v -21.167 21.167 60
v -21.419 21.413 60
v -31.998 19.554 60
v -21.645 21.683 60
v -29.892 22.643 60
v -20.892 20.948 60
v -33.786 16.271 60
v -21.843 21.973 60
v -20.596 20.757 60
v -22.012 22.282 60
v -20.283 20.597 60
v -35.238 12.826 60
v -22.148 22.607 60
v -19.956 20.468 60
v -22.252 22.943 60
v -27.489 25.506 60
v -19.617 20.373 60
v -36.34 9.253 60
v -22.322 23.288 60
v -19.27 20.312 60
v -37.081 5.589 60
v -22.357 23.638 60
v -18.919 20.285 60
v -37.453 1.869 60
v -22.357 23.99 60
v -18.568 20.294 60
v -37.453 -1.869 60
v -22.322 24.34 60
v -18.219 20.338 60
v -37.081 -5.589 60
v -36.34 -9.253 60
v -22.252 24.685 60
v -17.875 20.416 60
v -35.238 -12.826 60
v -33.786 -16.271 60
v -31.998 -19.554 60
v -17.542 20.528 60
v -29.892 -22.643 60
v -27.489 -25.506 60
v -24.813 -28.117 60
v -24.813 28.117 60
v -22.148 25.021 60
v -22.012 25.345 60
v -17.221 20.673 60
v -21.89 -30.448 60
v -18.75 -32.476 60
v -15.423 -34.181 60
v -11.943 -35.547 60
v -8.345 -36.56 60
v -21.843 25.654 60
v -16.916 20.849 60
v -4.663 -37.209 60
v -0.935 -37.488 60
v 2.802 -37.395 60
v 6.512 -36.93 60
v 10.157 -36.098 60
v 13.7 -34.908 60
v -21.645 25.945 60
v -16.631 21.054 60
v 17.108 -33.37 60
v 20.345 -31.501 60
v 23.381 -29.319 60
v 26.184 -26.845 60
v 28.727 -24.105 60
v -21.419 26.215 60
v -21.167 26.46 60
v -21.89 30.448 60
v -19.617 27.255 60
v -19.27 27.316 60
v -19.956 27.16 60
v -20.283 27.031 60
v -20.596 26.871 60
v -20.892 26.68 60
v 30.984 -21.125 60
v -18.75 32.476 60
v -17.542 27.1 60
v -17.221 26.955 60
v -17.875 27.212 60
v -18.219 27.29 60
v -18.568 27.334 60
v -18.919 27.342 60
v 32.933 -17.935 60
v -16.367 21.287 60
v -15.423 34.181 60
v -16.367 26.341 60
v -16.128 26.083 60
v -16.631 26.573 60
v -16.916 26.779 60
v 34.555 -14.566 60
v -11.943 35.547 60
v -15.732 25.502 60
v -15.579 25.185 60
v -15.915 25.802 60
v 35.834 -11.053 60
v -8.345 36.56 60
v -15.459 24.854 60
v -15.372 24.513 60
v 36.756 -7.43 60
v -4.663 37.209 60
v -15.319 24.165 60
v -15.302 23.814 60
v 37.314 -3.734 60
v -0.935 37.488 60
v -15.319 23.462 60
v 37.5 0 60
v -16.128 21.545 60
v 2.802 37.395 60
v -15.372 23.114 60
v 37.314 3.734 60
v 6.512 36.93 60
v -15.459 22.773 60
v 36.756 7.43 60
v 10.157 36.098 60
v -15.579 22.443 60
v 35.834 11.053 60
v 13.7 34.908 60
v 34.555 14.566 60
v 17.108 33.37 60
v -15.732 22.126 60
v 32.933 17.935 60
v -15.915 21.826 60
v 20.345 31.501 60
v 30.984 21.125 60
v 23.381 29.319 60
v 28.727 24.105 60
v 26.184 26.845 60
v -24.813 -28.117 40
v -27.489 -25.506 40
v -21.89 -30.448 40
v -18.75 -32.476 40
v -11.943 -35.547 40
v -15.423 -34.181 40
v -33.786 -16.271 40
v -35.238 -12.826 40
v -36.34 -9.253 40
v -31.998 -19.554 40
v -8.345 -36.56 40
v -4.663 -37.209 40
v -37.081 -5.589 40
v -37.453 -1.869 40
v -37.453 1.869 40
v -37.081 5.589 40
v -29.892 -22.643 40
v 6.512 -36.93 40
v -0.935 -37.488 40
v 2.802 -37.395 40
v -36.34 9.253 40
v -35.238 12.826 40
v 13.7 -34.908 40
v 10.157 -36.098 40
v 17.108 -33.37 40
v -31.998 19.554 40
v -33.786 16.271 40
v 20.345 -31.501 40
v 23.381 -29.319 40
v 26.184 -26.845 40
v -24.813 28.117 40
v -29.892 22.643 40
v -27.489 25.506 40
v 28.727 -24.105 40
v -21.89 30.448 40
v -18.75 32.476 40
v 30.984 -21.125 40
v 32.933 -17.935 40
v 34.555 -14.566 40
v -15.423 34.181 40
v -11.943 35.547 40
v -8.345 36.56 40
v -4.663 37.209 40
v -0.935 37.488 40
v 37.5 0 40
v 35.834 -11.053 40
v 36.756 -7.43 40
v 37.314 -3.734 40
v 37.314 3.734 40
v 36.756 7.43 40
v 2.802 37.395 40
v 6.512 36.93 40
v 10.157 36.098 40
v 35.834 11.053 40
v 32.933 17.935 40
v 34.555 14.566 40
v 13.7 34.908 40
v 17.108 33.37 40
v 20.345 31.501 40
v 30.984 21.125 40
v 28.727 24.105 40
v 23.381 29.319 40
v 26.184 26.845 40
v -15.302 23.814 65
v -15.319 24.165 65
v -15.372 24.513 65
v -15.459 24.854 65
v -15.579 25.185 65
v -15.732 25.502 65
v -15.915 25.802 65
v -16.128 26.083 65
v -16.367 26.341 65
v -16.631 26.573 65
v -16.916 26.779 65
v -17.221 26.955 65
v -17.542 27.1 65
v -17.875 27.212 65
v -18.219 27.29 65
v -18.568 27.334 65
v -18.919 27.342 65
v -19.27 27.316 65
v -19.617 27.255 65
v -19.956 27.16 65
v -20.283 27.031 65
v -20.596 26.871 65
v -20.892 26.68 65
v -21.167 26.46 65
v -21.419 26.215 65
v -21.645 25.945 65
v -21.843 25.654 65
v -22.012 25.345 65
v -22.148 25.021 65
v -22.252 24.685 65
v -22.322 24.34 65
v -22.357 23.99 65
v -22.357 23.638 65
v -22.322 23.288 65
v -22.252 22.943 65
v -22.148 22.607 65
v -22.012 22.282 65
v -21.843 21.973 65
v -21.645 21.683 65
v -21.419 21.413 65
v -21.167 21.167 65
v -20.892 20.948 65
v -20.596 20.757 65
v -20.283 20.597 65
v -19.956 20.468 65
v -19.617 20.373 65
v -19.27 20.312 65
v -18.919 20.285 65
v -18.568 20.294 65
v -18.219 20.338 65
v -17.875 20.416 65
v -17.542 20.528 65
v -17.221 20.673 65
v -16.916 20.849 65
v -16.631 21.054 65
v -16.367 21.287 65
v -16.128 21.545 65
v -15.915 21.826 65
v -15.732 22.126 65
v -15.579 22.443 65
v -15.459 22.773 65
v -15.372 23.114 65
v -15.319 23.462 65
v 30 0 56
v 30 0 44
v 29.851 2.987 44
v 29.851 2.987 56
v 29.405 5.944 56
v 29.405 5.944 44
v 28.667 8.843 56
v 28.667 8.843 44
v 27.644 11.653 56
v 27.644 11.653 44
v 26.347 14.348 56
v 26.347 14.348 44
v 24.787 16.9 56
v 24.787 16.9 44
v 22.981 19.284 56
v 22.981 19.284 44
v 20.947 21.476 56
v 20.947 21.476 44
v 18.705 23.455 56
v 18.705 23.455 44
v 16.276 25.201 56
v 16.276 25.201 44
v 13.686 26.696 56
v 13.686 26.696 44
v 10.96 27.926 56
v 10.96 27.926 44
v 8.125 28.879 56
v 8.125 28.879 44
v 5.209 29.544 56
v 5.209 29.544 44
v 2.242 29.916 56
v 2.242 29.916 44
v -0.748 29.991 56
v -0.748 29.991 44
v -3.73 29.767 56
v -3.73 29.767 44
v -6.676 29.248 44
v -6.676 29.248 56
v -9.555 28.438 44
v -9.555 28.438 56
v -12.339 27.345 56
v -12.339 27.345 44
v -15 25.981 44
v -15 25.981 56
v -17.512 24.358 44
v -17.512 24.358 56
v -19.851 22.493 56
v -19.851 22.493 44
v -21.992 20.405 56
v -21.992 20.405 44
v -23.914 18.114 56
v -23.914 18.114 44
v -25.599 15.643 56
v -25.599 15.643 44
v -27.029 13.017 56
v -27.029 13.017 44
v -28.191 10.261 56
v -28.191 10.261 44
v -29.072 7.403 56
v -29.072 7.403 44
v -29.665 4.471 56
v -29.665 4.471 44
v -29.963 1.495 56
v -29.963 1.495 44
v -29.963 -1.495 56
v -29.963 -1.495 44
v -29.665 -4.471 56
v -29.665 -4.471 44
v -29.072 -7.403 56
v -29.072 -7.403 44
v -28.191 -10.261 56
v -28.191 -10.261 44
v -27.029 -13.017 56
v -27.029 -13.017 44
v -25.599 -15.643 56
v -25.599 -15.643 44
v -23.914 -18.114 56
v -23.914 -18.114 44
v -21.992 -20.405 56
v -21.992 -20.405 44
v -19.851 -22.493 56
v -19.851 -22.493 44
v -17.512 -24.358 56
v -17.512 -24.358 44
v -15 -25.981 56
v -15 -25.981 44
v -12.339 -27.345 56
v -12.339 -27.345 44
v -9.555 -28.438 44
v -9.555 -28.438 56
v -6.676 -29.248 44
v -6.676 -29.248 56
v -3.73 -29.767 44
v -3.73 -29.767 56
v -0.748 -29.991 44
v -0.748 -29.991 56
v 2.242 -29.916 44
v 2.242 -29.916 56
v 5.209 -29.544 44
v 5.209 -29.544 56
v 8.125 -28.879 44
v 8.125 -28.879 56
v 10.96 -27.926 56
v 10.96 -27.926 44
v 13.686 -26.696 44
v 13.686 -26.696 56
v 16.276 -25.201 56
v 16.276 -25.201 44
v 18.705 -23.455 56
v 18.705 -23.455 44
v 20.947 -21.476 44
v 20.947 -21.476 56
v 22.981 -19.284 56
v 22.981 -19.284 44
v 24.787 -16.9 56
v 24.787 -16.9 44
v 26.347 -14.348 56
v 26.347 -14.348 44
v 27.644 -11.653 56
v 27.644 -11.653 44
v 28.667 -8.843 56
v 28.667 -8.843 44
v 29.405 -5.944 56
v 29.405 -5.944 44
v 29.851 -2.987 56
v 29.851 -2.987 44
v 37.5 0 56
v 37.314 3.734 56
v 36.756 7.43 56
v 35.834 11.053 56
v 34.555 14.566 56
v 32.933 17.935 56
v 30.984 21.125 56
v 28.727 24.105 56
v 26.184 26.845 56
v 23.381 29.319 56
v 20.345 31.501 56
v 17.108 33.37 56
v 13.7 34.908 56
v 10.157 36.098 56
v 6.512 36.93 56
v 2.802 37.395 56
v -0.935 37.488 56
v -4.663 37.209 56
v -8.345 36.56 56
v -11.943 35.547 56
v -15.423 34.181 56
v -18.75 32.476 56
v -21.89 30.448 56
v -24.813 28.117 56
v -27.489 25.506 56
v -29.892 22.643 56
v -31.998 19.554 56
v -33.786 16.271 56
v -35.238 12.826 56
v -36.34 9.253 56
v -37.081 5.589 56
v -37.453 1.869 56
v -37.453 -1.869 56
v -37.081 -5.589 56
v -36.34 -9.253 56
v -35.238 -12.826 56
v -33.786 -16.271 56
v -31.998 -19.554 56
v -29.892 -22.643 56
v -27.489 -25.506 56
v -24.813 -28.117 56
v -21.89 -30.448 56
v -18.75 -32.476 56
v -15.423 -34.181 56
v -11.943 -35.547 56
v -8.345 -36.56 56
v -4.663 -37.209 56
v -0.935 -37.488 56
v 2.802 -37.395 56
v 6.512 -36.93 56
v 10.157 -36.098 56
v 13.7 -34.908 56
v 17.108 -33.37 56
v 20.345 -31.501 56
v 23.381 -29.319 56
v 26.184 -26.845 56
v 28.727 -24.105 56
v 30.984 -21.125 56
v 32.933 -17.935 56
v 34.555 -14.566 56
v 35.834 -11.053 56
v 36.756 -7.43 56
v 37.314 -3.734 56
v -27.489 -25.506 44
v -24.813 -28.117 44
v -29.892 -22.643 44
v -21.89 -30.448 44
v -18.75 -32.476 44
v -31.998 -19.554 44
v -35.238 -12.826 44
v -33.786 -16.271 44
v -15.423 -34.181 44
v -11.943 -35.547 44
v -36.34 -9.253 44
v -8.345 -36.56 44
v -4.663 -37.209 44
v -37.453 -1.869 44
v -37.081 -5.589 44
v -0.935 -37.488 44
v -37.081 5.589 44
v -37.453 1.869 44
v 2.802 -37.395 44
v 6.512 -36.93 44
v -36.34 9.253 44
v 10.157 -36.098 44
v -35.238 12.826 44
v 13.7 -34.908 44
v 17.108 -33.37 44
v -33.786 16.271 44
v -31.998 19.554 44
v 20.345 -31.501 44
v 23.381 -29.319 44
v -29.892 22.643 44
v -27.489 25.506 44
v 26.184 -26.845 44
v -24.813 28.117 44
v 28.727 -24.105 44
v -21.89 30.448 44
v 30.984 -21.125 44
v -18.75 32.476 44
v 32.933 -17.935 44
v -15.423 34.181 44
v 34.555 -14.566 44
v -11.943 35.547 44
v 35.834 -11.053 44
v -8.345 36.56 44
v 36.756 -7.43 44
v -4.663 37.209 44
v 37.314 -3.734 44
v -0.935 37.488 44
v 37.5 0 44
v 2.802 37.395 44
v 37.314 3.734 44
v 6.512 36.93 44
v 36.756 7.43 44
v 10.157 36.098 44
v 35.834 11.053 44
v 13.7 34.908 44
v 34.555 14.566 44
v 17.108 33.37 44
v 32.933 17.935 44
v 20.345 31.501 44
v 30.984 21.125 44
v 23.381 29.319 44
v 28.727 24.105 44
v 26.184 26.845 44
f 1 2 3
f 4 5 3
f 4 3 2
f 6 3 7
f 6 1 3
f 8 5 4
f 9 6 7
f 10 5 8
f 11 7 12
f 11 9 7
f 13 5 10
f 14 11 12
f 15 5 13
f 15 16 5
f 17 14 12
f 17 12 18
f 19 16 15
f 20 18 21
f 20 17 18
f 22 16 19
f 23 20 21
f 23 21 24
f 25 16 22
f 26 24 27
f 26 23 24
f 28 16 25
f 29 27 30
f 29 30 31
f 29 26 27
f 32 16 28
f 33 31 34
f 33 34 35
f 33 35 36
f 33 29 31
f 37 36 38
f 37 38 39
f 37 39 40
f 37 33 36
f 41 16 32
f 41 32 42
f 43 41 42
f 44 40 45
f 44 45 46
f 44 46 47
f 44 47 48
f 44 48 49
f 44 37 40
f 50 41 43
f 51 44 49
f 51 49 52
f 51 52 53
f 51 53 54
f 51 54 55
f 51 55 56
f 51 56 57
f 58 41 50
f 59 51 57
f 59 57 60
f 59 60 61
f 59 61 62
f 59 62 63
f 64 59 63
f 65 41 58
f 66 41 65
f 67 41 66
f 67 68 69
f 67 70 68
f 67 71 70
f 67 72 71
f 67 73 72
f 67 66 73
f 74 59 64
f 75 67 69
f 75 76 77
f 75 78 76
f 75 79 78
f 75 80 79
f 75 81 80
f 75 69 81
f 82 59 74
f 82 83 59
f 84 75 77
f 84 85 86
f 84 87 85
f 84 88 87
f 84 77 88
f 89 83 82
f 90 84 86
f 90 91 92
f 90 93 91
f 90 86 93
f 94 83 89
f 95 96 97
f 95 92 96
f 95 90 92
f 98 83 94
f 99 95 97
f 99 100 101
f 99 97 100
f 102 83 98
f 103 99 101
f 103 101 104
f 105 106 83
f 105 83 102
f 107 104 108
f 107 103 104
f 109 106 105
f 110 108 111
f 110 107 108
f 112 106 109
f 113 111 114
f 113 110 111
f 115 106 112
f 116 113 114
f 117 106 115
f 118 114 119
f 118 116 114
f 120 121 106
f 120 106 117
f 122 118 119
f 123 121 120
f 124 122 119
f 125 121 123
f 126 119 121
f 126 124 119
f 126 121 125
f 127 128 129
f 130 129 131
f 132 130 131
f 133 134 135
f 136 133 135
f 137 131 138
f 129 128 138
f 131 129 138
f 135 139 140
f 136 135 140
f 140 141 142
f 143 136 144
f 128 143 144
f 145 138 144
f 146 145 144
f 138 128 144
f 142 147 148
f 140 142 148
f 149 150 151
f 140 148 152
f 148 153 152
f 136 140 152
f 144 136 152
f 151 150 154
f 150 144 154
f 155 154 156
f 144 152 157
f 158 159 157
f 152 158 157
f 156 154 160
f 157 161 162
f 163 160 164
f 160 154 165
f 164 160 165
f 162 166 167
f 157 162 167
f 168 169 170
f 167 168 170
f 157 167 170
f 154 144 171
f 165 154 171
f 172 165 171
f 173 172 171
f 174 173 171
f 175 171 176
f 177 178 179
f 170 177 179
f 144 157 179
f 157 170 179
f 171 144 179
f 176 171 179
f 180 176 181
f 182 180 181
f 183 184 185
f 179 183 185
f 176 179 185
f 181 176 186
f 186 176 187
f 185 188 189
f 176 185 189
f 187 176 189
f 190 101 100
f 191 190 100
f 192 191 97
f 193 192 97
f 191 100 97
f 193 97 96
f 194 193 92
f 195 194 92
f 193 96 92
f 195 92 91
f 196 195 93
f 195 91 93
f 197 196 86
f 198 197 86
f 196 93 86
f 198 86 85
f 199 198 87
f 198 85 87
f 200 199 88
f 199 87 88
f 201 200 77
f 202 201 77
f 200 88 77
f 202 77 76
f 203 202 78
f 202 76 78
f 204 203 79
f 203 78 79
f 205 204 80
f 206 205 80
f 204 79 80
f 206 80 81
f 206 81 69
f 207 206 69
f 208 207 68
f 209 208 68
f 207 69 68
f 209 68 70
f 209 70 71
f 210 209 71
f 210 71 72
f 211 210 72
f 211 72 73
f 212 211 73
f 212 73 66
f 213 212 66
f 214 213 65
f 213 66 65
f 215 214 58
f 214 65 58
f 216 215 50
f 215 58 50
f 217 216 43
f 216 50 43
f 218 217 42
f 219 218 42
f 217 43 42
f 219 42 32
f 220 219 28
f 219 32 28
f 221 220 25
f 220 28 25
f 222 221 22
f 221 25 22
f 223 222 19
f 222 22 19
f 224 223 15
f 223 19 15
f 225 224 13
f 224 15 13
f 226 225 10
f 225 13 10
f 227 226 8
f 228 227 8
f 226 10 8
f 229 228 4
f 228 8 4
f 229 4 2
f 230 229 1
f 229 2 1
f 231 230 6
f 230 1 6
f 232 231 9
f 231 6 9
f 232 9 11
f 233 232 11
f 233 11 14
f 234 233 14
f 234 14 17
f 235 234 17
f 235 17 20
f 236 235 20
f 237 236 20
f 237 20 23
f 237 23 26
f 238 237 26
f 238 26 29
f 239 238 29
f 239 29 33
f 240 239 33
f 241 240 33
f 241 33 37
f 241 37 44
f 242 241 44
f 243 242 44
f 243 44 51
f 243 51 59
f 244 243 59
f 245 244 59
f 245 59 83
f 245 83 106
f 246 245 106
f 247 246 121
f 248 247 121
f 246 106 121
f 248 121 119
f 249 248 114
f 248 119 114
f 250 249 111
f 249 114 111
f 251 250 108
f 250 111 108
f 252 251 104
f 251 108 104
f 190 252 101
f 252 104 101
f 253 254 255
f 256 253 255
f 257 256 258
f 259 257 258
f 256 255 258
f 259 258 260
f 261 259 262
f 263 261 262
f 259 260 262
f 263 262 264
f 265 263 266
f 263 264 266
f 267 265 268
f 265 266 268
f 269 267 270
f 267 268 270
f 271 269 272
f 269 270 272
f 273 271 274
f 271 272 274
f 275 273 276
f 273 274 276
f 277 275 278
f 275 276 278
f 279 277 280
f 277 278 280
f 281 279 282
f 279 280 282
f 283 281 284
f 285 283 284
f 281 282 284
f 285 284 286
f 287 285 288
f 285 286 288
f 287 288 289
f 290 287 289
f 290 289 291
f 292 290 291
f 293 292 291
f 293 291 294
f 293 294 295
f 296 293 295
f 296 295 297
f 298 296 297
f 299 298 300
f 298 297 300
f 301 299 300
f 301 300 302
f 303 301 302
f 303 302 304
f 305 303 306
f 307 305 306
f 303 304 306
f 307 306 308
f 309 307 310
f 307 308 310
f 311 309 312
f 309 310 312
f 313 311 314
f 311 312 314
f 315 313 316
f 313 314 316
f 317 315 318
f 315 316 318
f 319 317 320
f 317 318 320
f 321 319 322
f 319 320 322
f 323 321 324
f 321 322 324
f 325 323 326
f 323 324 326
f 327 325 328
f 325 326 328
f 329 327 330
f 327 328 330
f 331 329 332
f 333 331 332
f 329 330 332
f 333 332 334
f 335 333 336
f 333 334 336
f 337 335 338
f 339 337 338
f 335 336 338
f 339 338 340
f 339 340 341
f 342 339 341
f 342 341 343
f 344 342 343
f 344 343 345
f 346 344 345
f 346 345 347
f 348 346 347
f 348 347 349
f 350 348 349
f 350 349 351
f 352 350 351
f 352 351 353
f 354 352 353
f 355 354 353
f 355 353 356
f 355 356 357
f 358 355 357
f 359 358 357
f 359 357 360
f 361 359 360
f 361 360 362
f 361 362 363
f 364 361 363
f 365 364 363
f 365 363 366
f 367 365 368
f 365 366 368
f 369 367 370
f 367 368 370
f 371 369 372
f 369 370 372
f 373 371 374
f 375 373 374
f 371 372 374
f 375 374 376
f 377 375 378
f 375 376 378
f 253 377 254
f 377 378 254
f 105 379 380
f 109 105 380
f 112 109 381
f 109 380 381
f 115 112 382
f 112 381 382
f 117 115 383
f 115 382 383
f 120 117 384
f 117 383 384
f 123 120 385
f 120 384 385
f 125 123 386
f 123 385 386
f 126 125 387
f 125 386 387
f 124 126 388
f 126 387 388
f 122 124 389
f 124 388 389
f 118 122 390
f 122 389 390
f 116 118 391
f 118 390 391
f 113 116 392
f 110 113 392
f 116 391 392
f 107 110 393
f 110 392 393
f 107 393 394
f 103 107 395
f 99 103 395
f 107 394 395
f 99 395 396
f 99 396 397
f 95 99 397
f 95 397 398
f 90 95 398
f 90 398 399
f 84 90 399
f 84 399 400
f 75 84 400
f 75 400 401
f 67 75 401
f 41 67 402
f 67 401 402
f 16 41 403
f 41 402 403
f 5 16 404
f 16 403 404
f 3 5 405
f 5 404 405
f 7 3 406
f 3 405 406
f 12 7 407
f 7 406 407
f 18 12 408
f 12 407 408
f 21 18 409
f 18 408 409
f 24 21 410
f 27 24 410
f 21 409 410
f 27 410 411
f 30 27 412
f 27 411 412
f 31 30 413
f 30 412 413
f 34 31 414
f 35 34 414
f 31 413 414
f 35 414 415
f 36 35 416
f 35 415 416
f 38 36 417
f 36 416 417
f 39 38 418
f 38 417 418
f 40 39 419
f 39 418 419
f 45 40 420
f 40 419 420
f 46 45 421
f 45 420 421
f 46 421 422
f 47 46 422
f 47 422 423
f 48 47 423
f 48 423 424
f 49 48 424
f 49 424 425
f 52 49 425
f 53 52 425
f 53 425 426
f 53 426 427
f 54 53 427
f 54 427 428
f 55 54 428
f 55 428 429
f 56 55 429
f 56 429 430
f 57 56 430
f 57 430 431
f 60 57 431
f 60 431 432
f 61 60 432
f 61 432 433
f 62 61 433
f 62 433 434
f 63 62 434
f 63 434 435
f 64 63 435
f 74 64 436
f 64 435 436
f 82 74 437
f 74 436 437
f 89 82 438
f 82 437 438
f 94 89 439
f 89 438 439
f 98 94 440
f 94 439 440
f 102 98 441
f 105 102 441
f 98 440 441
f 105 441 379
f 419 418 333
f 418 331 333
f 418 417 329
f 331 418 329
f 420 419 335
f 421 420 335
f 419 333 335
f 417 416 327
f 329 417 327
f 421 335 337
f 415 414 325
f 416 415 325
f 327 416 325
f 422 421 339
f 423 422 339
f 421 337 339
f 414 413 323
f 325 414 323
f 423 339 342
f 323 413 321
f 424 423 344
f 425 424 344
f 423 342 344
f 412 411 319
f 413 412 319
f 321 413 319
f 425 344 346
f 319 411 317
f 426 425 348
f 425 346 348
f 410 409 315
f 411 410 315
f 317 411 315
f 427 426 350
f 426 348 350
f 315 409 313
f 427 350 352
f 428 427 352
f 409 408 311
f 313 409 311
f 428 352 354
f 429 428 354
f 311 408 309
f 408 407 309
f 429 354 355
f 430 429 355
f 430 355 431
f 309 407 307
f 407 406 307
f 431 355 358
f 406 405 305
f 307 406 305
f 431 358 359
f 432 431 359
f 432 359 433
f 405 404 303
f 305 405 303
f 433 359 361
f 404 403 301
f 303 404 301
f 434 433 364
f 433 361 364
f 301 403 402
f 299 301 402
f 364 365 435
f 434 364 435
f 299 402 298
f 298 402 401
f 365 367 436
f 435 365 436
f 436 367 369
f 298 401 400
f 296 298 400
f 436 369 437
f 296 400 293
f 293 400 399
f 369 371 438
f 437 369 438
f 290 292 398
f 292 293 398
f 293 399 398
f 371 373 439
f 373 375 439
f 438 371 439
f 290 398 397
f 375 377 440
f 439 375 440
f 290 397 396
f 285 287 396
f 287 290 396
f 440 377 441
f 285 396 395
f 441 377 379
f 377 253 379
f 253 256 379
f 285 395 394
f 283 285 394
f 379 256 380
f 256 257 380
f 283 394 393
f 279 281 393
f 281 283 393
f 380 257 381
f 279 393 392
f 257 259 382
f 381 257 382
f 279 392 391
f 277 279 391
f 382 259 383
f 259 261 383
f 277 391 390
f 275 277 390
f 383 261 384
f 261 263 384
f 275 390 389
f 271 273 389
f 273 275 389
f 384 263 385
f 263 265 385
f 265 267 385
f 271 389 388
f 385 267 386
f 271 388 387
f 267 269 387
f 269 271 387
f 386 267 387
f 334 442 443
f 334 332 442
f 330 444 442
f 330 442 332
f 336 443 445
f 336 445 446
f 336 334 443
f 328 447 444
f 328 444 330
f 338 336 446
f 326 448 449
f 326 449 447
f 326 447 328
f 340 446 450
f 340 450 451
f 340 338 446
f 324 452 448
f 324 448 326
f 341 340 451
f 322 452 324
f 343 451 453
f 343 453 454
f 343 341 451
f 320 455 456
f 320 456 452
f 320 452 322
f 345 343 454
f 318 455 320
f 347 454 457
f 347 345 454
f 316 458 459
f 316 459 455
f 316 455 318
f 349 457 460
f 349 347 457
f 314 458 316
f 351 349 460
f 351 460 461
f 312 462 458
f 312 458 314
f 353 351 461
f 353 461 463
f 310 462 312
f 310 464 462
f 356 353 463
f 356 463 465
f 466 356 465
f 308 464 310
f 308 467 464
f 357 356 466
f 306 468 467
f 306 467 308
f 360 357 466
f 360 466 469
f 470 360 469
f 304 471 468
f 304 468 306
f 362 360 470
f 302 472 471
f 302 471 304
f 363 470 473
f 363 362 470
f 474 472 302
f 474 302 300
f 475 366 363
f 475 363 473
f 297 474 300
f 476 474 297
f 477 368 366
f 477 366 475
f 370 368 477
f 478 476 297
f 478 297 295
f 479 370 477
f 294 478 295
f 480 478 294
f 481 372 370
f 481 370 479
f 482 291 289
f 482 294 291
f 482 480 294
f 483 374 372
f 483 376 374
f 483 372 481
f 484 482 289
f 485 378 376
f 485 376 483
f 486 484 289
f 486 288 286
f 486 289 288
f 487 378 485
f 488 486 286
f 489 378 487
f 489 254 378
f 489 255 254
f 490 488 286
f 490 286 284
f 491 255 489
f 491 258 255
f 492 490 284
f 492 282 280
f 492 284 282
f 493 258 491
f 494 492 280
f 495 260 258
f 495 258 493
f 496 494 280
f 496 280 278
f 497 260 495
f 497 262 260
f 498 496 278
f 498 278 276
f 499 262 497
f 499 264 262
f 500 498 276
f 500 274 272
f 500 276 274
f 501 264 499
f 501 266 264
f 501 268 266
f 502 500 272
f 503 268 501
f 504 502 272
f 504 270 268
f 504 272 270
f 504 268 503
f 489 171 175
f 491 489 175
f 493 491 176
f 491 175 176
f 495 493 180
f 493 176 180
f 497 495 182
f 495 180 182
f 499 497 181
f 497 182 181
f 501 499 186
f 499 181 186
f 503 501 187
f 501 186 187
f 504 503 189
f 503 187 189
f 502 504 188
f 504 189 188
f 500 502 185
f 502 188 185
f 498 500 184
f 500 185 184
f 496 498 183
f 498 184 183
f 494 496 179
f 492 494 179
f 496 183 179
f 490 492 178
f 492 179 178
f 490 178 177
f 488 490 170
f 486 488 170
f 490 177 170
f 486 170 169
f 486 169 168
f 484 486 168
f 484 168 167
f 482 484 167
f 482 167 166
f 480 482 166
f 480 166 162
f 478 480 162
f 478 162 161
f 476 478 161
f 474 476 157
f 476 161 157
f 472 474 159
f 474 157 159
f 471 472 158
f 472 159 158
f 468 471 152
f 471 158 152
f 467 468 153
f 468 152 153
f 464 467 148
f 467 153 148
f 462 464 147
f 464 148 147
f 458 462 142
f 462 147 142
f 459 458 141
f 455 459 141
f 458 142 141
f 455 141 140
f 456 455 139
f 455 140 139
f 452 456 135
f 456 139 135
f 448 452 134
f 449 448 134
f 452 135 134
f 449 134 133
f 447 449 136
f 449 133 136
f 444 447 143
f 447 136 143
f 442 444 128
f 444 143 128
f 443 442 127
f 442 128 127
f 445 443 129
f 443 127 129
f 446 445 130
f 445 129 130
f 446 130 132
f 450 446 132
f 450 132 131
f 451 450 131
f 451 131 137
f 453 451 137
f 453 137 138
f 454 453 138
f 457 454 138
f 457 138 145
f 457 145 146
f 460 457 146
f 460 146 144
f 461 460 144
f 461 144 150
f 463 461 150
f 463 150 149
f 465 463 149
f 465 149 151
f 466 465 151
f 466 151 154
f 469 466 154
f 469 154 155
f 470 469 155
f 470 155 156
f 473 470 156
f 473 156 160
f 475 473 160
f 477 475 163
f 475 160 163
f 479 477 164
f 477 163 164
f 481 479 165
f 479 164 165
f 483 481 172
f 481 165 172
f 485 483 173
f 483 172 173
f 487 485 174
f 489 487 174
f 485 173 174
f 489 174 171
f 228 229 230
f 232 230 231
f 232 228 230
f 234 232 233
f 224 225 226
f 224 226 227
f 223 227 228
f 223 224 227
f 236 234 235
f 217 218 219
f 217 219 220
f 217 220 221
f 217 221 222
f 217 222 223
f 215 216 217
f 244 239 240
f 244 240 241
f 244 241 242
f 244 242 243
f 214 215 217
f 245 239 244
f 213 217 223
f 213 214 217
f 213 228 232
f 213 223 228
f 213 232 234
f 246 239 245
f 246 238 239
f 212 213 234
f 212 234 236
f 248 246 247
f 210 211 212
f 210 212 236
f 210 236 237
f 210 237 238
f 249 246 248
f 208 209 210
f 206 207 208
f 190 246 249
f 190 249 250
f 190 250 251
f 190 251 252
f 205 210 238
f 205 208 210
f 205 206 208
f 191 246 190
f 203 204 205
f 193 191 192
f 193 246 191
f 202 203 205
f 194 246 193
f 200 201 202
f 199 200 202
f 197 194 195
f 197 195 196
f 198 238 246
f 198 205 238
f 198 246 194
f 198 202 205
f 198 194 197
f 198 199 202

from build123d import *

# Parameters (mm, degrees)
F2_R      = 37.5
F3_DEPTH  = 4
F5_R      = 30
F6_DEPTH  = 12
F8_R      = 37.5
F9_DEPTH  = 4
F15_R     = 3.5296355076
F16_DEPTH = 5


with BuildPart() as f3:
    # F2 (on Top) → F3 (new body)
    with BuildSketch(Plane.XY):
        Circle(F2_R)
    extrude(amount=F3_DEPTH)

    # F5 (on offset) → F6 (join)
    with BuildSketch(Plane.XY.offset(4)):
        Circle(F5_R)
    extrude(amount=F6_DEPTH)

    # F8 (on offset) → F9 (join)
    with BuildSketch(Plane.XY.offset(16)):
        Circle(F8_R)
    extrude(amount=F9_DEPTH)


with BuildPart() as f10_1:
    # F10: copy of F3
    add(f3.part.moved(Location((0, 0, 20))))


with BuildPart() as f12_1:
    # F12: copy of F3
    add(f3.part)


with BuildPart() as f3_1:
    # F14: moved
    add(f3.part.moved(Location((0, 0, 40))))

    # F15 (on face) → F16 (join)
    with BuildSketch(Plane.XY.offset(60)):
        with Locations((-18.8314225525, 23.8138604909)):
            Circle(F15_R)
    extrude(amount=F16_DEPTH)


solid = f3_1.part
